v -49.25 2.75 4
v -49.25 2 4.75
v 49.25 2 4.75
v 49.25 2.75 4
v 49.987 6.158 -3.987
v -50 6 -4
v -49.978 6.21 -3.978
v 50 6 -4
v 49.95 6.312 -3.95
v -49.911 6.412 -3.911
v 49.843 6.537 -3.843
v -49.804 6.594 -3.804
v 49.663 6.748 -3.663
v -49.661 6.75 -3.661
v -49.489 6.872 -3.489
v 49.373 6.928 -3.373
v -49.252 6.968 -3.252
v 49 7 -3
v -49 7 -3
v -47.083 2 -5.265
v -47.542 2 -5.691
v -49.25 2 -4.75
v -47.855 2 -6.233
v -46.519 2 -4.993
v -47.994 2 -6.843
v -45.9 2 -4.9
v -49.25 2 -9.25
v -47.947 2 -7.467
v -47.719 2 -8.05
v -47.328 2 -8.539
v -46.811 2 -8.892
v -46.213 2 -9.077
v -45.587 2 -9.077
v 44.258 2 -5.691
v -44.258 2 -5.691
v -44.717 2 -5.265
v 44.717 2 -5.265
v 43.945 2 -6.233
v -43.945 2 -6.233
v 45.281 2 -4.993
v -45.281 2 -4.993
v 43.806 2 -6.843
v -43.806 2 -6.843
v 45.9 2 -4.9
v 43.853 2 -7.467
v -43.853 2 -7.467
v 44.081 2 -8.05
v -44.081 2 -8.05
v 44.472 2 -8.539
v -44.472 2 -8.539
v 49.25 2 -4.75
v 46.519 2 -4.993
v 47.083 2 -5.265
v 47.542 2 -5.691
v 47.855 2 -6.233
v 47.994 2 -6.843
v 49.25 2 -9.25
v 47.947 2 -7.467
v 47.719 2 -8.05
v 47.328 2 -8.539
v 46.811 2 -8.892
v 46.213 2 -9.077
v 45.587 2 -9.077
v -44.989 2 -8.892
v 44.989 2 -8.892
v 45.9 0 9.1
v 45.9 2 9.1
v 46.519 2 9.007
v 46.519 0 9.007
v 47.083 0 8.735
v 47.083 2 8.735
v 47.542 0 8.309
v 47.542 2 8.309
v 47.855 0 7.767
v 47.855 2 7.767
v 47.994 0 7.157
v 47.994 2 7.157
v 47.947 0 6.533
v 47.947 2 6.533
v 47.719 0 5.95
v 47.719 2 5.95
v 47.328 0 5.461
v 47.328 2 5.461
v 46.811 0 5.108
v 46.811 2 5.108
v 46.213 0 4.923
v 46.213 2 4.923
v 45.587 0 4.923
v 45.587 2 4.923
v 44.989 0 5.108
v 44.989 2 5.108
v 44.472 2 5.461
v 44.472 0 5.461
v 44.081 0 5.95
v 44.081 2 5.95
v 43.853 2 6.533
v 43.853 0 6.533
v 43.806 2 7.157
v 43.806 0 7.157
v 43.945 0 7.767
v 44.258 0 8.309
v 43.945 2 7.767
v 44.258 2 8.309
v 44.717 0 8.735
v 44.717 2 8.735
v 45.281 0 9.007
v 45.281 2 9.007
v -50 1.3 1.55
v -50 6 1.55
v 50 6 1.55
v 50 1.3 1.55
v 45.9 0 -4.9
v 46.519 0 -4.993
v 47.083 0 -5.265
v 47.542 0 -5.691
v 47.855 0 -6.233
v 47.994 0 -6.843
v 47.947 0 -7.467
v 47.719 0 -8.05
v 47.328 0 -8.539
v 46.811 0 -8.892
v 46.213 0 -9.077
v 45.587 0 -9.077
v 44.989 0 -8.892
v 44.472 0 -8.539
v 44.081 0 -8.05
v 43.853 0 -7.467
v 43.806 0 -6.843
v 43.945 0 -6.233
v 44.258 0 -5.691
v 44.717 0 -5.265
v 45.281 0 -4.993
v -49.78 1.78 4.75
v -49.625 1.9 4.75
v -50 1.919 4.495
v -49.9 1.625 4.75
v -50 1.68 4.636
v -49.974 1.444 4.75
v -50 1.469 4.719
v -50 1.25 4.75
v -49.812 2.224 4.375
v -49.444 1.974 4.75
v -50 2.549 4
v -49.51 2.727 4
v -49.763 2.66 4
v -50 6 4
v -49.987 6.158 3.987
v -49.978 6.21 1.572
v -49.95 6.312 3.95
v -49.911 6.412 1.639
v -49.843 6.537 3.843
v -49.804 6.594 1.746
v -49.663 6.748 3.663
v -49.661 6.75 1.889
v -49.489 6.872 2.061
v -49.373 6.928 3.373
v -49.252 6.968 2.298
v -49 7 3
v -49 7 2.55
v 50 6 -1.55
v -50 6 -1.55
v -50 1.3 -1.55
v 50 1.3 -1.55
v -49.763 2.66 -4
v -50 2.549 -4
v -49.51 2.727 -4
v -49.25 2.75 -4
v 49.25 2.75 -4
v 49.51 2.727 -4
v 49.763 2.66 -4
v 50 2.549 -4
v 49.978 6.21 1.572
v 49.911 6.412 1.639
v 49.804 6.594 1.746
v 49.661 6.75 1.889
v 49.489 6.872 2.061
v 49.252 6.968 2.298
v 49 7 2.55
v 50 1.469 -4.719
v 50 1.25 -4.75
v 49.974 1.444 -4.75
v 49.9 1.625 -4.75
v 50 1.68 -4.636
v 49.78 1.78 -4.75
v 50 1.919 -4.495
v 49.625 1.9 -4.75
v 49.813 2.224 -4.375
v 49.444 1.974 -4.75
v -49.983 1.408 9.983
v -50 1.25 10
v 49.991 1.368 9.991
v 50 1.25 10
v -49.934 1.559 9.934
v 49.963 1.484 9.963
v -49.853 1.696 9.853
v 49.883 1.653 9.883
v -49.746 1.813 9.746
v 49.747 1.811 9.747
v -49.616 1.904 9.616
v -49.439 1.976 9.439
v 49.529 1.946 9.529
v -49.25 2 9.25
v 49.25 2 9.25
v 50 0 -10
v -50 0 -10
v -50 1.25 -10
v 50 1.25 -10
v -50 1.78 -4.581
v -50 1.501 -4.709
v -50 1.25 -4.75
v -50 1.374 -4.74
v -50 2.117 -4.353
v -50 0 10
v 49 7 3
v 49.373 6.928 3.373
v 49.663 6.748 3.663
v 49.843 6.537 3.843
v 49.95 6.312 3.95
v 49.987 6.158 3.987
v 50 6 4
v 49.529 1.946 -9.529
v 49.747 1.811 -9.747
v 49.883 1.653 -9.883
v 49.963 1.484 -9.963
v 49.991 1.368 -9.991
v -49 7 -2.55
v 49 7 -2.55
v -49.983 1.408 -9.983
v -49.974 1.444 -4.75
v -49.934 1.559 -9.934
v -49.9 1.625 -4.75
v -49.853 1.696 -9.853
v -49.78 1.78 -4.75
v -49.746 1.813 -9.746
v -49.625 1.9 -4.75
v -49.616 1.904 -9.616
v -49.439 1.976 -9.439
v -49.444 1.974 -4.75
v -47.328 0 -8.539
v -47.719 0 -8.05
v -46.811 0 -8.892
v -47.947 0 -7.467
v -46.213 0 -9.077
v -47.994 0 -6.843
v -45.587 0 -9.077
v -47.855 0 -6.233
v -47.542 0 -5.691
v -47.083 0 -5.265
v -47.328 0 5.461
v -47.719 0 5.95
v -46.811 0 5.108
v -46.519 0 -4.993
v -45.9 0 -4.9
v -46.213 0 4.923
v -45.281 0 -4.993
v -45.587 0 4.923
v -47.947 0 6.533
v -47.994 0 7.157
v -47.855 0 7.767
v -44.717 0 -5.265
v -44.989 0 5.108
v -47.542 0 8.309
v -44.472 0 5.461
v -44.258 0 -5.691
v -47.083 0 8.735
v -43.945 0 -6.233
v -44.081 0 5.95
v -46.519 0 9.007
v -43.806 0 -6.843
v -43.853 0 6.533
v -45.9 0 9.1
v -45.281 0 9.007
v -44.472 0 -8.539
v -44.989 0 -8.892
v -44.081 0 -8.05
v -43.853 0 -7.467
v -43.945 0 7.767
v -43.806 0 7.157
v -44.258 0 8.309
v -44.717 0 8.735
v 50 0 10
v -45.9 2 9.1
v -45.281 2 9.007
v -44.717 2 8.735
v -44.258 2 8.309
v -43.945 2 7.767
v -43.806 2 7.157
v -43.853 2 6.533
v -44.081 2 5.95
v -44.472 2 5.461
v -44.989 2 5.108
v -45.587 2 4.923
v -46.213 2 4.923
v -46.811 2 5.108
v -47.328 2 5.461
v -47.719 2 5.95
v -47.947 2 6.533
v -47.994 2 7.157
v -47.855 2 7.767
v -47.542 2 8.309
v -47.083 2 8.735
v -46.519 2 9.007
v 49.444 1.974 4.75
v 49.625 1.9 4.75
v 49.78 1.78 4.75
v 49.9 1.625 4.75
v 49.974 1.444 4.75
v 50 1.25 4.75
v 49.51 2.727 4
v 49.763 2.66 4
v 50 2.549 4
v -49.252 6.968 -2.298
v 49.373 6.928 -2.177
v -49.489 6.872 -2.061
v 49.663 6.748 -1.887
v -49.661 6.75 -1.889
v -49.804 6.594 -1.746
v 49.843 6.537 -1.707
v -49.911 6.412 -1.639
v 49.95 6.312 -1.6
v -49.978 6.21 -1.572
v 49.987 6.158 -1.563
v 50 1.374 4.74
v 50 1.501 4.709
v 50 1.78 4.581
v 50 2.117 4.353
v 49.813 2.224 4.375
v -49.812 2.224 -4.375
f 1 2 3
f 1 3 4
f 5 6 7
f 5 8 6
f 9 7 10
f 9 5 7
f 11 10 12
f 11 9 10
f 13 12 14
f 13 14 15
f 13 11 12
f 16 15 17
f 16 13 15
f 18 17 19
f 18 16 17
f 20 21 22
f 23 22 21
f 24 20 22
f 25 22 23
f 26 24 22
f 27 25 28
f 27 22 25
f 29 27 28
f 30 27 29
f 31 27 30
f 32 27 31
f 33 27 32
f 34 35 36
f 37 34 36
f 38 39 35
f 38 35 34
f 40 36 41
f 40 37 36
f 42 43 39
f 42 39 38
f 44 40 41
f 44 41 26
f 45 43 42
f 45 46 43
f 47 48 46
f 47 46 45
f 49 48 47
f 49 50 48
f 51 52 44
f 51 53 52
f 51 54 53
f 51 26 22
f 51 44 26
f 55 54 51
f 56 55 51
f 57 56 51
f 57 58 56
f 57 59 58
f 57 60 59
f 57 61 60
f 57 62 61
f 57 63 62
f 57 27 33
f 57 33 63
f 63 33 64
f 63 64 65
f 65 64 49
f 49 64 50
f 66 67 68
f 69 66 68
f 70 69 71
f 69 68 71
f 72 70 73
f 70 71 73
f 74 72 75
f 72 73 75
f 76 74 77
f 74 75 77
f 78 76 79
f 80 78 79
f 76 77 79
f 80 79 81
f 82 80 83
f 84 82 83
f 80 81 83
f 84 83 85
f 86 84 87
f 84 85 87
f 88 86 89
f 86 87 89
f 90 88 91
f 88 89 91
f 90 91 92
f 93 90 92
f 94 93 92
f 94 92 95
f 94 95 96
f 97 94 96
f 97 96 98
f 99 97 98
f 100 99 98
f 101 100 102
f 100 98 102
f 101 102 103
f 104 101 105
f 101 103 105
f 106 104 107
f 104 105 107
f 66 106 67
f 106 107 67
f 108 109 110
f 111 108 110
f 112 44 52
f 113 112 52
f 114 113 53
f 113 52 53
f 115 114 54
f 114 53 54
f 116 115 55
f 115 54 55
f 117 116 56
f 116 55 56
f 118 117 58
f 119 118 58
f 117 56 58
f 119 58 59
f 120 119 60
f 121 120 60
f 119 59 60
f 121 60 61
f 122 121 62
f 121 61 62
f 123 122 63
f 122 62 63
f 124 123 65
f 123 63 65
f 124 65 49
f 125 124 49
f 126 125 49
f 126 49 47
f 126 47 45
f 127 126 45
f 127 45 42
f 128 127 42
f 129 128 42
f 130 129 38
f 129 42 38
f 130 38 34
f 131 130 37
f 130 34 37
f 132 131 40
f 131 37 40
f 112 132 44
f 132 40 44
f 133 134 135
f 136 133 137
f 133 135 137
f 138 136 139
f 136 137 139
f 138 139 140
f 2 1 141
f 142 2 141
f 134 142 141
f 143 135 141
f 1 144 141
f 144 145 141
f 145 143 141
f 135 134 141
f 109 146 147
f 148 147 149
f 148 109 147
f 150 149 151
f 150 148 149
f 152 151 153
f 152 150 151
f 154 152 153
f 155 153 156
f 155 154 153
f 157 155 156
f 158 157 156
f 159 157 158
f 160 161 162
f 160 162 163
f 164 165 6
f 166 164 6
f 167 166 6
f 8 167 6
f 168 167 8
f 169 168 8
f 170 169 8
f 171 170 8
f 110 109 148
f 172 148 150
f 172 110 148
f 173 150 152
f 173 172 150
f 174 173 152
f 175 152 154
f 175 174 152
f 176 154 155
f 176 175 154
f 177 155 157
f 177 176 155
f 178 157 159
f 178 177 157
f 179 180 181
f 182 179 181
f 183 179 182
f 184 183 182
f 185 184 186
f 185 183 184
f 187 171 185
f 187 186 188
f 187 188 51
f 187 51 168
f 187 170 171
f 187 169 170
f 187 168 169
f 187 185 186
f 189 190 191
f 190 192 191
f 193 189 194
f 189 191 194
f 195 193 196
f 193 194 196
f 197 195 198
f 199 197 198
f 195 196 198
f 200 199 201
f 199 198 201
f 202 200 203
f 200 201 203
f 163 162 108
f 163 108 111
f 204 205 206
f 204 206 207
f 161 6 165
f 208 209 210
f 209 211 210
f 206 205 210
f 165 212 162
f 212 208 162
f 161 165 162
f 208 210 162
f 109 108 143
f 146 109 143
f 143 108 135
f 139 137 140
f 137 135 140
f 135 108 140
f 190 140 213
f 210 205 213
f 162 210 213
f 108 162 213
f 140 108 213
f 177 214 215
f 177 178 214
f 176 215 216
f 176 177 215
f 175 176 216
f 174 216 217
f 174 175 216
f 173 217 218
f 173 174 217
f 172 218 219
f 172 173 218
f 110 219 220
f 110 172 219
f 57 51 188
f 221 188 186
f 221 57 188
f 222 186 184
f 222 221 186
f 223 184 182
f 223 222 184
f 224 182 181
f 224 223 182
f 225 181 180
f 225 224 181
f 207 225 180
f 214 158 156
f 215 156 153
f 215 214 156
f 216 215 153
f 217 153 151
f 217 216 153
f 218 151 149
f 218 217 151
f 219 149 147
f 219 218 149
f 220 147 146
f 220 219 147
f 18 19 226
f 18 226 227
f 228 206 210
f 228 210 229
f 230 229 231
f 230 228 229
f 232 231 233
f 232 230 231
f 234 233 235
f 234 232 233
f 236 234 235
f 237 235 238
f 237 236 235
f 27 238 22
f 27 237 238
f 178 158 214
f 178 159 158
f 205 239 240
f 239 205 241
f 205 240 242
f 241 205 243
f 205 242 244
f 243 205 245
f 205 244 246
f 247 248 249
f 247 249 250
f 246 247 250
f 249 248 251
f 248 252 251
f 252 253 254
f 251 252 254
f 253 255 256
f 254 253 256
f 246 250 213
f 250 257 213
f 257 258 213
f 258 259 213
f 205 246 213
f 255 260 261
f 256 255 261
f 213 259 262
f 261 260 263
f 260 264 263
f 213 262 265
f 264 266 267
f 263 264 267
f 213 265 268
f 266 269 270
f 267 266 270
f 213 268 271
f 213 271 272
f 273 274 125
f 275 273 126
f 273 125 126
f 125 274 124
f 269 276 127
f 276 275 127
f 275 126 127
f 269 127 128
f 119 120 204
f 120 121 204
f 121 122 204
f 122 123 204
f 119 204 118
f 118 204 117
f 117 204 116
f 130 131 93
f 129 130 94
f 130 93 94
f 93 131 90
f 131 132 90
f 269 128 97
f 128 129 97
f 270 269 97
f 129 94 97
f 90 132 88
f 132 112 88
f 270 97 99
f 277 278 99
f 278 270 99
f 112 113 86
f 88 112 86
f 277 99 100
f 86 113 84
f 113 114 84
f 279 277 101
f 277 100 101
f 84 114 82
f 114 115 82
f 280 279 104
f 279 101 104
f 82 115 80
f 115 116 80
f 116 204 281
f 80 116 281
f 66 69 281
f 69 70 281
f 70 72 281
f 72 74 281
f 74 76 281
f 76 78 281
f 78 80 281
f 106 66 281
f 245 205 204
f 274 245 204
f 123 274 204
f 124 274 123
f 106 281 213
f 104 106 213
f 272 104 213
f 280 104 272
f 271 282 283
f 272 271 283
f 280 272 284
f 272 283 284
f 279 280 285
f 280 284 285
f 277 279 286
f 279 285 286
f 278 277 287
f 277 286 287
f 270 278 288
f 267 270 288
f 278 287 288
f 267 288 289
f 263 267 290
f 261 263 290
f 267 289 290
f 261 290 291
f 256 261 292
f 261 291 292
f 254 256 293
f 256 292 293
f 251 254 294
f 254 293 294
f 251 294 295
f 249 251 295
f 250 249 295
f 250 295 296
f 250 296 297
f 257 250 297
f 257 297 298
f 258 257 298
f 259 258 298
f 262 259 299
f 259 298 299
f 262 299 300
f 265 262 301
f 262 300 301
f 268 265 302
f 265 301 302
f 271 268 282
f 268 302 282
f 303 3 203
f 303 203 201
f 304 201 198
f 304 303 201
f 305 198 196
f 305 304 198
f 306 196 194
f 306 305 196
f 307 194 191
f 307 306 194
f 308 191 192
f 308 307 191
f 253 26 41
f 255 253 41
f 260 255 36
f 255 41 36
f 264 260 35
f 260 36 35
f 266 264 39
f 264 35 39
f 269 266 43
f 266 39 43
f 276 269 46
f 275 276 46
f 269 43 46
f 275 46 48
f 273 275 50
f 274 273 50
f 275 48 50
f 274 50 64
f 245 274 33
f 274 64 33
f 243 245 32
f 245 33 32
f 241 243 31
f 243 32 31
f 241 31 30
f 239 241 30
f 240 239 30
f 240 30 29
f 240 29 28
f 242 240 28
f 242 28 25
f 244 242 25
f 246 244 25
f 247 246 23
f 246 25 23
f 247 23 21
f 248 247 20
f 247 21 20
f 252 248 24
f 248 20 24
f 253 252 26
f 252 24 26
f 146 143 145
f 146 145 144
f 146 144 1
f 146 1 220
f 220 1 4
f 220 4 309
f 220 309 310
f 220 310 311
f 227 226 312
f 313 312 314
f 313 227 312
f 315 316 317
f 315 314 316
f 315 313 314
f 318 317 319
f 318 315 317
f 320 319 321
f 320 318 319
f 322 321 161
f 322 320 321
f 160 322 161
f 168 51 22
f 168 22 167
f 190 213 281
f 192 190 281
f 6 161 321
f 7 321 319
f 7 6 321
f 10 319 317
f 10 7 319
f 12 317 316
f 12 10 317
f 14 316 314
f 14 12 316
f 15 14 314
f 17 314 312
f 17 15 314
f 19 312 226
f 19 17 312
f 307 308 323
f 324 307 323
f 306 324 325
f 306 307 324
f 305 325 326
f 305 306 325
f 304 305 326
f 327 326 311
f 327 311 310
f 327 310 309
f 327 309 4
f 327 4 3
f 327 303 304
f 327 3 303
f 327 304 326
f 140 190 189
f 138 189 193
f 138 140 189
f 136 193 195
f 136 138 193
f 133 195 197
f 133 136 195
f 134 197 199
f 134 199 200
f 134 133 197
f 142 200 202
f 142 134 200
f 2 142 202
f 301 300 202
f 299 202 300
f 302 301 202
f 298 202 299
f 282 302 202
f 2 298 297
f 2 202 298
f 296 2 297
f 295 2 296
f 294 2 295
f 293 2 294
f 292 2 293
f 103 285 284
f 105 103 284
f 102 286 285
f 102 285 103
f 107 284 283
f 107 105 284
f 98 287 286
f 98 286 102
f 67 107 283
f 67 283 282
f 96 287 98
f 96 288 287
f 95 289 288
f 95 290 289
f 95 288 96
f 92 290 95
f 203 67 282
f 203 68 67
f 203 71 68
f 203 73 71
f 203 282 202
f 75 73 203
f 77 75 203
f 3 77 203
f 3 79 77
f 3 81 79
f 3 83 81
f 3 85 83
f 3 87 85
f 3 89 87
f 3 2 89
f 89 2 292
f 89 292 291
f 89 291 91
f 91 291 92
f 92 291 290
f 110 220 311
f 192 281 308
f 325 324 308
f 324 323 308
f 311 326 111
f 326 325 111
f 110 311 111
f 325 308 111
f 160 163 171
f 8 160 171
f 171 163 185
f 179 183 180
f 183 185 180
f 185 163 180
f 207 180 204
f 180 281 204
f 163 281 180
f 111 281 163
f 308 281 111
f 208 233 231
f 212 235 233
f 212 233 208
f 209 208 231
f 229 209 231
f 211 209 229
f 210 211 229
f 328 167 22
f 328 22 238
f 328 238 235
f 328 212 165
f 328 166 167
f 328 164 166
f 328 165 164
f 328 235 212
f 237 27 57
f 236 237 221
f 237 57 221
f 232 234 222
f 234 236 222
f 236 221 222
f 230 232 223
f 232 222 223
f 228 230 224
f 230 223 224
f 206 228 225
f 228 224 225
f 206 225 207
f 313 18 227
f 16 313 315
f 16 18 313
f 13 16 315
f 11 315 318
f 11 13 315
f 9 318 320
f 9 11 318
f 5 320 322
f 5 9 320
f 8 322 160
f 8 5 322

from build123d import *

# Parameters (mm, degrees)
SKETCH1_W           = 100
SKETCH1_H           = 8
BOSS_EXTRUDE1_DEPTH = 7
SKETCH3_W           = 100
SKETCH3_H           = 20
BOSS_EXTRUDE2_DEPTH = 2
SKETCH2_W           = 100
SKETCH2_H           = 3.1
CUT_EXTRUDE1_DEPTH  = 5.7
FILLET1_R           = 1
SKETCH4_R           = 2.1
CUT_EXTRUDE2_DEPTH  = 2
FILLET2_R           = 0.75
CHAMFER1_SIZE       = 0.75


with BuildPart() as part:
    # Sketch1 → Boss-Extrude1 (new body)
    with BuildSketch(Plane(origin=(0, 0, 0), x_dir=(1, 0, 0), z_dir=(0, 1, 0))):
        Rectangle(SKETCH1_W, SKETCH1_H)
    extrude(amount=BOSS_EXTRUDE1_DEPTH)

    # Sketch3 → Boss-Extrude2 (add)
    with BuildSketch(Plane(origin=(0, 0, 0), x_dir=(1, 0, 0), z_dir=(0, 1, 0))):
        Rectangle(SKETCH3_W, SKETCH3_H)
    extrude(amount=BOSS_EXTRUDE2_DEPTH)

    # Sketch2 → Cut-Extrude1 (cut)
    with BuildSketch(Plane(origin=(0, 7, 0), x_dir=(1, 0, 0), z_dir=(0, 1, 0))):
        Rectangle(SKETCH2_W, SKETCH2_H)
    extrude(amount=-CUT_EXTRUDE1_DEPTH, mode=Mode.SUBTRACT)

    # Fillet1
    fillet1_edges = [part.edges().sort_by_distance(p)[0] for p in [
        (-50, 7, -2.775),
        (0, 7, 4),
        (50, 7, -2.775),
        (-50, 7, 2.775),
        (0, 7, -1.55),
        (0, 7, 1.55),
        (50, 7, 2.775),
        (0, 7, -4),
    ]]
    fillet(fillet1_edges, radius=FILLET1_R)

    # Sketch4 → Cut-Extrude2 (cut)
    with BuildSketch(Plane(origin=(0, 2, 0), x_dir=(1, 0, 0), z_dir=(0, 1, 0))):
        with Locations(Location((-45.9, 7, 0), (0, 0, 270))):
            Circle(SKETCH4_R)
        with Locations(Location((-45.9, -7, 0), (0, 0, 270))):
            Circle(SKETCH4_R)
        with Locations(Location((45.9, 7, 0), (0, 0, 270))):
            Circle(SKETCH4_R)
        with Locations(Location((45.9, -7, 0), (0, 0, 270))):
            Circle(SKETCH4_R)
    extrude(amount=-CUT_EXTRUDE2_DEPTH, mode=Mode.SUBTRACT)

    # Fillet2
    fillet2_edges = [part.edges().sort_by_distance(p)[0] for p in [
        (-50, 2, -7),
        (50, 2, -7),
        (0, 2, -10),
        (50, 2, 7),
        (-50, 2, 7),
        (0, 2, 10),
    ]]
    fillet(fillet2_edges, radius=FILLET2_R)

    # Chamfer1
    # the kernel refuses this chamfer: 0.75 mm, written as the material it adds along each edge
    with BuildSketch(Plane(origin=(49.25, 2, -4), x_dir=(0, -0.02749587661058648, -0.9996219169112968), z_dir=(-1, 0, 0)), Plane(origin=(-49.25, 2, 4), x_dir=(0, -0.02749587661058648, 0.9996219169112968), z_dir=(1, 0, 0))) as chamfer1_piece_1:
        Polygon((CHAMFER1_SIZE * 0.999621916911, -CHAMFER1_SIZE * 0.0274958766106), (-CHAMFER1_SIZE * 0.0274958766106, -CHAMFER1_SIZE * 0.999621916911), (0, 0), align=None)
    extrude(amount=98.5)
    with BuildSketch(Plane(origin=(49.25, 1.25, -4), x_dir=(-0.8425066666450713, -0.5386859165215022, 0), z_dir=(-0.5386859165215022, 0.8425066666450713, 0))) as chamfer1_piece_2_section:
        Polygon((0.75, -CHAMFER1_SIZE), (0.75 + CHAMFER1_SIZE, 0), (0.75, 0), align=None)
    chamfer1_piece_2 = revolve(axis=Axis((49.25, 1.25, -4), (0, 0, 1)), revolution_arc=237.405771779, mode=Mode.PRIVATE)
    chamfer1_piece_2 = split(chamfer1_piece_2, bisect_by=Plane(origin=(50, 1.825736319, -4.33178547), z_dir=(-1, 0, 0)), keep=Keep.TOP, mode=Mode.PRIVATE)
    chamfer1_piece_2 = split(chamfer1_piece_2, bisect_by=Plane(origin=(49.825736319, 0, -4.33178547), z_dir=(0, 1, 0)), keep=Keep.TOP, mode=Mode.PRIVATE)
    add(chamfer1_piece_2)
    with BuildSketch(Plane(origin=(49.25, 1.25, 4), x_dir=(-0.8425066666450713, -0.5386859165215022, 0), z_dir=(-0.5386859165215022, 0.8425066666450713, 0))) as chamfer1_piece_3_section:
        Polygon((0.75 + CHAMFER1_SIZE, 0), (0.75, CHAMFER1_SIZE), (0.75, 0), align=None)
    chamfer1_piece_3 = revolve(axis=Axis((49.25, 1.25, 4), (0, 0, 1)), revolution_arc=237.405771779, mode=Mode.PRIVATE)
    chamfer1_piece_3 = split(chamfer1_piece_3, bisect_by=Plane(origin=(50, 1.825736319, 4.33178547), z_dir=(-1, 0, 0)), keep=Keep.TOP, mode=Mode.PRIVATE)
    chamfer1_piece_3 = split(chamfer1_piece_3, bisect_by=Plane(origin=(49.825736319, 0, 4.33178547), z_dir=(0, 1, 0)), keep=Keep.TOP, mode=Mode.PRIVATE)
    add(chamfer1_piece_3)
    with BuildSketch(Plane(origin=(-49.25, 1.25, 4), x_dir=(0, 1, 0), z_dir=(1, 0, 0))) as chamfer1_piece_4_section:
        Polygon((0.75, CHAMFER1_SIZE), (0.75 + CHAMFER1_SIZE, 0), (0.75, 0), align=None)
    chamfer1_piece_4 = revolve(axis=Axis((-49.25, 1.25, 4), (0, 0, 1)), revolution_arc=237.405771779, mode=Mode.PRIVATE)
    chamfer1_piece_4 = split(chamfer1_piece_4, bisect_by=Plane(origin=(-50, 1.825736319, 4.33178547), z_dir=(1, 0, 0)), keep=Keep.TOP, mode=Mode.PRIVATE)
    chamfer1_piece_4 = split(chamfer1_piece_4, bisect_by=Plane(origin=(-49.825736319, 0, 4.33178547), z_dir=(0, 1, 0)), keep=Keep.TOP, mode=Mode.PRIVATE)
    add(chamfer1_piece_4)
    with BuildSketch(Plane(origin=(-49.25, 1.25, -4), x_dir=(0, 1, 0), z_dir=(1, 0, 0))) as chamfer1_piece_5_section:
        Polygon((0.75, -CHAMFER1_SIZE), (0.75 + CHAMFER1_SIZE, 0), (0.75, 0), align=None)
    chamfer1_piece_5 = revolve(axis=Axis((-49.25, 1.25, -4), (0, 0, 1)), revolution_arc=237.405771779, mode=Mode.PRIVATE)
    chamfer1_piece_5 = split(chamfer1_piece_5, bisect_by=Plane(origin=(-50, 1.825736319, -4.33178547), z_dir=(1, 0, 0)), keep=Keep.TOP, mode=Mode.PRIVATE)
    chamfer1_piece_5 = split(chamfer1_piece_5, bisect_by=Plane(origin=(-49.825736319, 0, -4.33178547), z_dir=(0, 1, 0)), keep=Keep.TOP, mode=Mode.PRIVATE)
    add(chamfer1_piece_5)


solid = part.part
